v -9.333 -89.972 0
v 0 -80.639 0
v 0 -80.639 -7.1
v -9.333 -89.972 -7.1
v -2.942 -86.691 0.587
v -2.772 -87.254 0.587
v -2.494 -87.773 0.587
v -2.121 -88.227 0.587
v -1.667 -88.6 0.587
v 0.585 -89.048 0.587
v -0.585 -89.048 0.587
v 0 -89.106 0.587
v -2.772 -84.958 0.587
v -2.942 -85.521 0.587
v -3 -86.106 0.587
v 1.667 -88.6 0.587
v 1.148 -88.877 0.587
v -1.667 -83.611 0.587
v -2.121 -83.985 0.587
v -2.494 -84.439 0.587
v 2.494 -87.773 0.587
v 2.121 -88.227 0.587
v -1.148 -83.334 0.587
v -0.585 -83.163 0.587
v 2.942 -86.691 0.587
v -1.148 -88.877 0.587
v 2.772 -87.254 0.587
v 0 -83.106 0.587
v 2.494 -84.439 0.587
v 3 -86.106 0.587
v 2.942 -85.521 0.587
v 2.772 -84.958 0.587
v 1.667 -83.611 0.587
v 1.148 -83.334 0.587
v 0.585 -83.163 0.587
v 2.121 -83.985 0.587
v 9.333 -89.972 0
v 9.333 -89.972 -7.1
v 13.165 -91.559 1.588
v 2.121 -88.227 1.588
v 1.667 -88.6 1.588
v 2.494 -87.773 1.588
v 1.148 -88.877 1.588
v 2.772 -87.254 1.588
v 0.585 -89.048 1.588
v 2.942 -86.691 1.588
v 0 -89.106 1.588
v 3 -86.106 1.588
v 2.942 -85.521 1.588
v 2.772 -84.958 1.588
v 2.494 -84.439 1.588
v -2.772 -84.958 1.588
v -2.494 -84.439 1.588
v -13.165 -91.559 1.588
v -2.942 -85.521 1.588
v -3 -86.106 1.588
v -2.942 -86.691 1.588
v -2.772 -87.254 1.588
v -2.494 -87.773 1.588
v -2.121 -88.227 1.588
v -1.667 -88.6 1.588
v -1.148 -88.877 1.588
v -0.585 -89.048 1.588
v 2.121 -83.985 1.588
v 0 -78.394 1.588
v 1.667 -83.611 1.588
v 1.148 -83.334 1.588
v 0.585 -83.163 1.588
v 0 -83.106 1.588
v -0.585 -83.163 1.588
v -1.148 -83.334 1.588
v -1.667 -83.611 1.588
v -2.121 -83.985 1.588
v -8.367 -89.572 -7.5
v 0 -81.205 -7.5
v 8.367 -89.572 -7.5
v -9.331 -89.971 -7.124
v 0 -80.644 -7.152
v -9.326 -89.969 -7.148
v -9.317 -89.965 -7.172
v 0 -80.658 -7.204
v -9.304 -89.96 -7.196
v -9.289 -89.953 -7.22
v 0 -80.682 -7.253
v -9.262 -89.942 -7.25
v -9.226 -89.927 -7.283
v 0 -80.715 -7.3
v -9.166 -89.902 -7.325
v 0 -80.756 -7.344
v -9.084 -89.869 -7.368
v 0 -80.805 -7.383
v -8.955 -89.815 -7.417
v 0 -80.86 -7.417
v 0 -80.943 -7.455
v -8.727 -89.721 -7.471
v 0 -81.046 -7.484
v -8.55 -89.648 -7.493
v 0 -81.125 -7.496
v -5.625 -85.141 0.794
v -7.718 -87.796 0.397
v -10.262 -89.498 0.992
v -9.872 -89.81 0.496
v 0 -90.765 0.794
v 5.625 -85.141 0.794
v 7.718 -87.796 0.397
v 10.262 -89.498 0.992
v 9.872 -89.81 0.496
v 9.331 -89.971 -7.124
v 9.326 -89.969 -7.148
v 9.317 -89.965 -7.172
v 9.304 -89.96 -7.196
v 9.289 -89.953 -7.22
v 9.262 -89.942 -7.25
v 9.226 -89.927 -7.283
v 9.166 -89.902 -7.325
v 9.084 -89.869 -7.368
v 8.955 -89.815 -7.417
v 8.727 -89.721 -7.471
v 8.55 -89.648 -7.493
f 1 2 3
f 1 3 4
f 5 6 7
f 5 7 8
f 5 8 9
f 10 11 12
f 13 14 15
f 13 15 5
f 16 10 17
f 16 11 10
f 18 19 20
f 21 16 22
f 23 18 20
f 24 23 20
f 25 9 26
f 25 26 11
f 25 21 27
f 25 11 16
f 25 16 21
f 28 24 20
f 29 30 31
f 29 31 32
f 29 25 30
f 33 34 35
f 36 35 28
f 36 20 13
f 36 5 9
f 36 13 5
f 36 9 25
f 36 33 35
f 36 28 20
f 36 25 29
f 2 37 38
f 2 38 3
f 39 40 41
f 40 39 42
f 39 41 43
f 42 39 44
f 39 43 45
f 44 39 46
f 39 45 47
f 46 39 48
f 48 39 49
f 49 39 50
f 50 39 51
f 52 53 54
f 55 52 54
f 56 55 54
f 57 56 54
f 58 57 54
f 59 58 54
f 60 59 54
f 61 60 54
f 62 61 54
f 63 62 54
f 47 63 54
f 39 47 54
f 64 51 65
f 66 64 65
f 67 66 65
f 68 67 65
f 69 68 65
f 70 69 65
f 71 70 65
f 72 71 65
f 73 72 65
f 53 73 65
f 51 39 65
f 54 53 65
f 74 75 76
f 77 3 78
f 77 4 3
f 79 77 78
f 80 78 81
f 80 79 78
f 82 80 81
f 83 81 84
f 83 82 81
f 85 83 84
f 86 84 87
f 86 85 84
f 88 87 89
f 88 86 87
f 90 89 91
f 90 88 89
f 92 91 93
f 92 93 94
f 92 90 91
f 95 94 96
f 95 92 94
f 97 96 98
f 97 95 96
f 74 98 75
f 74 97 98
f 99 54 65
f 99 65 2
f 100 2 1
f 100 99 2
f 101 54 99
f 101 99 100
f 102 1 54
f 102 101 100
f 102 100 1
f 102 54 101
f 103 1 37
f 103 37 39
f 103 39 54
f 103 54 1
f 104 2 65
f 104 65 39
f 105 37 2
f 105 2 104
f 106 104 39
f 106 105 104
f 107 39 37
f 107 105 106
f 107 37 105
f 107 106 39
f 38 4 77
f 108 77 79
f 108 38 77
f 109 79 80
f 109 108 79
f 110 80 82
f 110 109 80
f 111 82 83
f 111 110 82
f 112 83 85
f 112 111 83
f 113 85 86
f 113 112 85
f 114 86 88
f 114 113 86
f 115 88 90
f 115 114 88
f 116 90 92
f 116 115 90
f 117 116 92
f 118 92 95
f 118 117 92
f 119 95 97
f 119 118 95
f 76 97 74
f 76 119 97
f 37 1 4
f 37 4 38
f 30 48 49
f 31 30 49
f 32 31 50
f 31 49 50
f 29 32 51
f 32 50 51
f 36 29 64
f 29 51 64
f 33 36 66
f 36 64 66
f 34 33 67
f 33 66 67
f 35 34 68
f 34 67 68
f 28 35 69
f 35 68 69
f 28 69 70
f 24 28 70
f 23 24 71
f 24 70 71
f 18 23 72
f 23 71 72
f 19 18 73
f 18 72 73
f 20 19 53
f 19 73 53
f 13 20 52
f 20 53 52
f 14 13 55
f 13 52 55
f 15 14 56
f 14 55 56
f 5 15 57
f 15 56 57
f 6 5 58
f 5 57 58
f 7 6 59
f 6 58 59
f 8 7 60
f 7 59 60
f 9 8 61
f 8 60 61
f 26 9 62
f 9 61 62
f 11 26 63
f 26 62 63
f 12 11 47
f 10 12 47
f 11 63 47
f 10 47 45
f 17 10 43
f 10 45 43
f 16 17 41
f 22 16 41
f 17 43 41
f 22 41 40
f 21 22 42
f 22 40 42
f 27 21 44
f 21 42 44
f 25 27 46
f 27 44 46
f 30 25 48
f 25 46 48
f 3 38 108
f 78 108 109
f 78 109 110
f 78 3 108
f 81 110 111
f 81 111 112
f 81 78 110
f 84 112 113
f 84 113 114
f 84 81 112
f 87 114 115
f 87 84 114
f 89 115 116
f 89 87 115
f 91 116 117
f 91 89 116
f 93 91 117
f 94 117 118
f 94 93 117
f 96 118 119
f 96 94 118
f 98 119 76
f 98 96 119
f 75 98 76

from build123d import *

# Parameters (mm, degrees)
BOSS_EXTRUDE1_DEPTH = 7.5
FILLET1_R           = 0.4
SKETCH3_R           = 3
CUT_EXTRUDE2_DEPTH  = 1


with BuildPart() as part:
    # Sketch1 → Boss-Extrude1 (new body)
    with BuildSketch(Plane.XY):
        Polygon((9.332731301, -89.971589642), (0, -80.638858341), (-9.332731301, -89.971589642), align=None)
    extrude(amount=-BOSS_EXTRUDE1_DEPTH)

    # Sketch2 → section 1 of loft1
    with BuildSketch(Plane.XY.offset(1.5875), mode=Mode.PRIVATE) as loft1_s1:
        Polygon((-13.165295331, -91.559089642), (13.165295331, -91.559089642), (0, -78.393794311), align=None)
    # loft from a face of the part (loft1)
    loft([part.faces().sort_by_distance((0, -86.860679209, 0))[0], loft1_s1.sketch])

    # Fillet1
    fillet1_edges = [part.edges().sort_by_distance(p)[0] for p in [
        (-4.666365651, -85.305223992, -7.5),
        (0, -89.971589642, -7.5),
        (4.666365651, -85.305223992, -7.5),
    ]]
    fillet(fillet1_edges, radius=FILLET1_R)

    # Sketch3 → Cut-Extrude2 (cut)
    with BuildSketch(Plane.XY.offset(1.5875)):
        with Locations((0, -86.105845763)):
            Circle(SKETCH3_R)
    extrude(amount=-CUT_EXTRUDE2_DEPTH, mode=Mode.SUBTRACT)


solid = part.part
